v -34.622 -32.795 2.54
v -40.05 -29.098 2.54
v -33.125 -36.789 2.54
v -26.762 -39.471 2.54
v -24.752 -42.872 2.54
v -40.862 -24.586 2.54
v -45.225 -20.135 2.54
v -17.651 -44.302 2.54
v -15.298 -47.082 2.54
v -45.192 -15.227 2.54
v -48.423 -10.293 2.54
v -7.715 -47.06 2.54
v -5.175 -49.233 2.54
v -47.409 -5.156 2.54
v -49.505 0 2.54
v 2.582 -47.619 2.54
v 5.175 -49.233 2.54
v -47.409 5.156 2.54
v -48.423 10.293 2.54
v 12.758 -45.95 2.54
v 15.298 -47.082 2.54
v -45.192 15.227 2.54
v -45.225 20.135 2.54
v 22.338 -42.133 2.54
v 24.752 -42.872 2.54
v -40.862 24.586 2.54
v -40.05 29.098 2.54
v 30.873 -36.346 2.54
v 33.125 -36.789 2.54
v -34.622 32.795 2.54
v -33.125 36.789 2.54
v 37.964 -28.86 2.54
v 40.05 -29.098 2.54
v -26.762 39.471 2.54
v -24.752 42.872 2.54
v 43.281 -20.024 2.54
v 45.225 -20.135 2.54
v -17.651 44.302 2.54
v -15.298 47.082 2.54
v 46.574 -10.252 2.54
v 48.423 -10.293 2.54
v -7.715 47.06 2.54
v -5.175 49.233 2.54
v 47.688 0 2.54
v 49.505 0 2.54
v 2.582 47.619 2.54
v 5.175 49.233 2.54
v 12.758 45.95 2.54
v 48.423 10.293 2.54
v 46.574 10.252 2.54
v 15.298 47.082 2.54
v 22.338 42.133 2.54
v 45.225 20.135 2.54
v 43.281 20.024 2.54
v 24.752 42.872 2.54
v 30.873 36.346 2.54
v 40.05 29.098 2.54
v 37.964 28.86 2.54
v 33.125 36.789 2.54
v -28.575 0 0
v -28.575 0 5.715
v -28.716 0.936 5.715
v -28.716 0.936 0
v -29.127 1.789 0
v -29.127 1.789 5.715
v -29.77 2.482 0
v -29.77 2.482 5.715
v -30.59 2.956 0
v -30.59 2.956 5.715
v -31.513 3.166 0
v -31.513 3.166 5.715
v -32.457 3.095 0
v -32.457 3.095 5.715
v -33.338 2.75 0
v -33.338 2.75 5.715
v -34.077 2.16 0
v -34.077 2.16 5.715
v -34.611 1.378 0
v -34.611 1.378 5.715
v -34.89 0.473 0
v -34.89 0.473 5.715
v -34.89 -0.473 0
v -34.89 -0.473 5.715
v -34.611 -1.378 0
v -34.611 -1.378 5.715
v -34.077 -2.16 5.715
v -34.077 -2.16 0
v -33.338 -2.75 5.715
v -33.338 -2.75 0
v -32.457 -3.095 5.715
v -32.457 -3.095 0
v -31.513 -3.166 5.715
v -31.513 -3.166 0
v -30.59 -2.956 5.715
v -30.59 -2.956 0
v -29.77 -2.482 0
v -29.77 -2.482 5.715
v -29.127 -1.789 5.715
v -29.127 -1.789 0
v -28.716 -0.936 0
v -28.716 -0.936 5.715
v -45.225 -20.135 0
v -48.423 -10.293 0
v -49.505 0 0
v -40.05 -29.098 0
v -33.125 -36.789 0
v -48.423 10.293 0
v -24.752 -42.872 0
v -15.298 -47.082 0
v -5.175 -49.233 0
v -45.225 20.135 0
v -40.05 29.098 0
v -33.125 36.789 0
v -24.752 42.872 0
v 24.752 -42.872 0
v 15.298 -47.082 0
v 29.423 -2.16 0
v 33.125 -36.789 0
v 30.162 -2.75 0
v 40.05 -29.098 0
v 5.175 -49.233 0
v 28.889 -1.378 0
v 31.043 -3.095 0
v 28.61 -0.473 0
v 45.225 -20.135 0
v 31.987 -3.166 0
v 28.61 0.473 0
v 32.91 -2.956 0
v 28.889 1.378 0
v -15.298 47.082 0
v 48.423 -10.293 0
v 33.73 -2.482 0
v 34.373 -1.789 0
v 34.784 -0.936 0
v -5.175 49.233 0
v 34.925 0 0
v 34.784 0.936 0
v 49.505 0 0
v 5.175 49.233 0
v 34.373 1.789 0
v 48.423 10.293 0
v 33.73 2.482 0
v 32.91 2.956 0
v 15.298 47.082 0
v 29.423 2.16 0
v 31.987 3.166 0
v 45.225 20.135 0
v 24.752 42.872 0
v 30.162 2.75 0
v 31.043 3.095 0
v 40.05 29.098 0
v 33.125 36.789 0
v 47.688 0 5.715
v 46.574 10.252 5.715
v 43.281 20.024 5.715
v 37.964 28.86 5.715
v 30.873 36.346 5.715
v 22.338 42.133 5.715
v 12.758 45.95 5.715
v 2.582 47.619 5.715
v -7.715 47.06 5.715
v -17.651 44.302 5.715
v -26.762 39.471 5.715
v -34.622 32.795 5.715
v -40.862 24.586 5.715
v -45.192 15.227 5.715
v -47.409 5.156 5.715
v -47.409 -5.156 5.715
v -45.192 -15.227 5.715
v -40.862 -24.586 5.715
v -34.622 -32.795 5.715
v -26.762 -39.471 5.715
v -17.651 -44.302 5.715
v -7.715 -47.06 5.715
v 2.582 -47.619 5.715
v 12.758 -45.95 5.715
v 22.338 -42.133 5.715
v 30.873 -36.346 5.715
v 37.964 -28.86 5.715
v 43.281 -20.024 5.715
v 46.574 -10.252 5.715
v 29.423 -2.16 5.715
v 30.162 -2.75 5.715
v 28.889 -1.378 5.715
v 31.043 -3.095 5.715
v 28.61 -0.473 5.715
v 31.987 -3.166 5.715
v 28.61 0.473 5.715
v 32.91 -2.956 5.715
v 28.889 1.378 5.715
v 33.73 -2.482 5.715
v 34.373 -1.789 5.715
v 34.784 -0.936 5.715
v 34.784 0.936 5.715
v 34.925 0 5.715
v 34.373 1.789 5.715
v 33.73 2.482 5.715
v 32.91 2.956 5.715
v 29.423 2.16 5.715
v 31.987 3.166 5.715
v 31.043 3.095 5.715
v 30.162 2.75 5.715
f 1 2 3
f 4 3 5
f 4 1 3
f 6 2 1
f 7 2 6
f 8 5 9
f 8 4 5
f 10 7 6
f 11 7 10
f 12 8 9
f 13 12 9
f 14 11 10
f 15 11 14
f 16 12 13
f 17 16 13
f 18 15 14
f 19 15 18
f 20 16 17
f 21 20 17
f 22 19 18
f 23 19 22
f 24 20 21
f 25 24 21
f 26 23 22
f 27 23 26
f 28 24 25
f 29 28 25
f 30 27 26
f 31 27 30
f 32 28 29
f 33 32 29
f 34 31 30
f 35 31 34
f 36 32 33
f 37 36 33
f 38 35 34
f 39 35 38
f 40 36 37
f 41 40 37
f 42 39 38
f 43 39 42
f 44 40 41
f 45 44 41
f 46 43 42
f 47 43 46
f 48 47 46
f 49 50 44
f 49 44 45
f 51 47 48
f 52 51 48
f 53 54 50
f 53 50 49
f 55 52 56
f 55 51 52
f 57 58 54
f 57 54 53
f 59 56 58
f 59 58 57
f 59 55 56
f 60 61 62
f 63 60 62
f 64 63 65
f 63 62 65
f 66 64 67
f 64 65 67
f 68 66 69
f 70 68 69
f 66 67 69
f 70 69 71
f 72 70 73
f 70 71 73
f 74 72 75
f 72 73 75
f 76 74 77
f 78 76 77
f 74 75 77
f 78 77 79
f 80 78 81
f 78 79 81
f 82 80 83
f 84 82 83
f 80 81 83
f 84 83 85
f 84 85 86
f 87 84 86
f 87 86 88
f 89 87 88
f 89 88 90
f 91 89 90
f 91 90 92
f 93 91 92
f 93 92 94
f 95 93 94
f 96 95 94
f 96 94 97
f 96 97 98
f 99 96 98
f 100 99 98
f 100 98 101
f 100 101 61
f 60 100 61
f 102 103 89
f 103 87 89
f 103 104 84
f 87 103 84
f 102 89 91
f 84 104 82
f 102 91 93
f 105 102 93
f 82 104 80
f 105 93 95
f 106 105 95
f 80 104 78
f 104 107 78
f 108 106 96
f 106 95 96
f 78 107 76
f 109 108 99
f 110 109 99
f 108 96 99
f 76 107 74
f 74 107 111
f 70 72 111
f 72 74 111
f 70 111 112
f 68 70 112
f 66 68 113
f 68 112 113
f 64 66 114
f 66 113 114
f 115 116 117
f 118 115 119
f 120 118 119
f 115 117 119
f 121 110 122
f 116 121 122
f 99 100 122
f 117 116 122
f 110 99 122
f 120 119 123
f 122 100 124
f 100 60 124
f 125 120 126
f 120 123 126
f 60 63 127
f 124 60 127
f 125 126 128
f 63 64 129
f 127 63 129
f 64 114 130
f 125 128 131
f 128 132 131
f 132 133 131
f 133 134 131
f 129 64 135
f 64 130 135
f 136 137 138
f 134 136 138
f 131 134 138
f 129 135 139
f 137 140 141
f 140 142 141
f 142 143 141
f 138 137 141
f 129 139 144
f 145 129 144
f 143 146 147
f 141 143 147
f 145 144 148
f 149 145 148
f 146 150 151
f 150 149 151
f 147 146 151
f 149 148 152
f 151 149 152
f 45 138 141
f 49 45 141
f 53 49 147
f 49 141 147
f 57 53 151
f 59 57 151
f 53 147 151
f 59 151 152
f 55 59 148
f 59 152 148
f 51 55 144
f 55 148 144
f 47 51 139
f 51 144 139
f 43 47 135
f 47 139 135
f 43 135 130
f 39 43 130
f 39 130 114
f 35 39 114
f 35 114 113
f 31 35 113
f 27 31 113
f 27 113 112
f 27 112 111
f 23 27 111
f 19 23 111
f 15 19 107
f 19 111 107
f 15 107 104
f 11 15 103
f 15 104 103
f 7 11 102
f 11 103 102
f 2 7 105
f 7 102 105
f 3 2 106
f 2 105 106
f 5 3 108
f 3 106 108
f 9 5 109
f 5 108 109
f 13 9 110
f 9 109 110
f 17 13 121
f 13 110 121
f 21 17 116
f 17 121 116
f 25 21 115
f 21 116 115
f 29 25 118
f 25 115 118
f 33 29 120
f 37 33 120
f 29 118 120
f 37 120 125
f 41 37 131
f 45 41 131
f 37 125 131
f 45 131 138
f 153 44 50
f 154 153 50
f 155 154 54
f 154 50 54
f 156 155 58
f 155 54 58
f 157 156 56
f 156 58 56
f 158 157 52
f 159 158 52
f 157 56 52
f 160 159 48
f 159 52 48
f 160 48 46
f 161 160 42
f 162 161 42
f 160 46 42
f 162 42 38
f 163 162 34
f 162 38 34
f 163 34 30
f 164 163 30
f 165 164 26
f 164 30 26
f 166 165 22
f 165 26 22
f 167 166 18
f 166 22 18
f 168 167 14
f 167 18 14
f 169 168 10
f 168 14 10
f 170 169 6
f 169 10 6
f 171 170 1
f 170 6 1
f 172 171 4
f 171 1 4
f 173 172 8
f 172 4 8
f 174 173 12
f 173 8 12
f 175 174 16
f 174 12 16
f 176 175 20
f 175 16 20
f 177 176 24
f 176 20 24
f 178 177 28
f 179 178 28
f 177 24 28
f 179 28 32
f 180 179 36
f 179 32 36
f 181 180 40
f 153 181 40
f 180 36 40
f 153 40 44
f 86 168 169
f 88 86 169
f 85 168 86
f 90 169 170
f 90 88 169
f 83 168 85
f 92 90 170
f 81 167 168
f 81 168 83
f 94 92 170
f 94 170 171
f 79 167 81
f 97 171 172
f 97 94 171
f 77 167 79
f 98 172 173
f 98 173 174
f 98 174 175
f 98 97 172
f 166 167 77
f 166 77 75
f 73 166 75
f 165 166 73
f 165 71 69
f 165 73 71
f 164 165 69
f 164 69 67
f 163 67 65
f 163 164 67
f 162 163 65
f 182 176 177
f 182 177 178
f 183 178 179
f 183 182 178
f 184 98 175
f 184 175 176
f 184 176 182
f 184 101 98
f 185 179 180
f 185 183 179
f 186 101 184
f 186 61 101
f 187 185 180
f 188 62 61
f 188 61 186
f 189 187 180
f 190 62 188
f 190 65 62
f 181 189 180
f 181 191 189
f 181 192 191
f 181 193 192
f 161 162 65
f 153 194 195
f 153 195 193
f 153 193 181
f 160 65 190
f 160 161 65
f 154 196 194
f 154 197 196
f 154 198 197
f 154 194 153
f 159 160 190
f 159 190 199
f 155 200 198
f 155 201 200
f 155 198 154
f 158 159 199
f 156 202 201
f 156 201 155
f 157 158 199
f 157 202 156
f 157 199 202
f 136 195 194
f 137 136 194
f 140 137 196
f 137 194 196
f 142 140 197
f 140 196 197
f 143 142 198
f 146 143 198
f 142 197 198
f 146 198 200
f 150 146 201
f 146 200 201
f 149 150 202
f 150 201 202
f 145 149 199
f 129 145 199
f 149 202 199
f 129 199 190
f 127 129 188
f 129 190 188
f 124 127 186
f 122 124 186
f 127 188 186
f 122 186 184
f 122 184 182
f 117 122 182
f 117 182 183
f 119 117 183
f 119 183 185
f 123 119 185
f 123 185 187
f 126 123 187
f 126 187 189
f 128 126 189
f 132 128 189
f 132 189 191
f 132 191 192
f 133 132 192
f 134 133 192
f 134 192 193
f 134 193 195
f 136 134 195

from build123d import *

# Parameters (mm, degrees)
SKETCH1_R           = 49.5046
BOSS_EXTRUDE1_DEPTH = 2.54
SKETCH2_R           = 47.6885
BOSS_EXTRUDE2_DEPTH = 3.175
SKETCH3_R           = 3.175
CUT_EXTRUDE1_DEPTH  = 6.715


with BuildPart() as part:
    # Sketch1 → Boss-Extrude1 (new body)
    with BuildSketch(Plane.XY):
        Circle(SKETCH1_R)
    extrude(amount=BOSS_EXTRUDE1_DEPTH)

    # Sketch2 → Boss-Extrude2 (add)
    with BuildSketch(Plane.XY.offset(2.54)):
        Circle(SKETCH2_R)
    extrude(amount=BOSS_EXTRUDE2_DEPTH)

    # Sketch3 → Cut-Extrude1 (cut, through all)
    with BuildSketch(Plane.XY.offset(5.715)):
        with Locations((-31.75, 0)):
            Circle(SKETCH3_R)
        with Locations((31.75, 0)):
            Circle(SKETCH3_R)
    extrude(amount=-CUT_EXTRUDE1_DEPTH, mode=Mode.SUBTRACT)


solid = part.part
